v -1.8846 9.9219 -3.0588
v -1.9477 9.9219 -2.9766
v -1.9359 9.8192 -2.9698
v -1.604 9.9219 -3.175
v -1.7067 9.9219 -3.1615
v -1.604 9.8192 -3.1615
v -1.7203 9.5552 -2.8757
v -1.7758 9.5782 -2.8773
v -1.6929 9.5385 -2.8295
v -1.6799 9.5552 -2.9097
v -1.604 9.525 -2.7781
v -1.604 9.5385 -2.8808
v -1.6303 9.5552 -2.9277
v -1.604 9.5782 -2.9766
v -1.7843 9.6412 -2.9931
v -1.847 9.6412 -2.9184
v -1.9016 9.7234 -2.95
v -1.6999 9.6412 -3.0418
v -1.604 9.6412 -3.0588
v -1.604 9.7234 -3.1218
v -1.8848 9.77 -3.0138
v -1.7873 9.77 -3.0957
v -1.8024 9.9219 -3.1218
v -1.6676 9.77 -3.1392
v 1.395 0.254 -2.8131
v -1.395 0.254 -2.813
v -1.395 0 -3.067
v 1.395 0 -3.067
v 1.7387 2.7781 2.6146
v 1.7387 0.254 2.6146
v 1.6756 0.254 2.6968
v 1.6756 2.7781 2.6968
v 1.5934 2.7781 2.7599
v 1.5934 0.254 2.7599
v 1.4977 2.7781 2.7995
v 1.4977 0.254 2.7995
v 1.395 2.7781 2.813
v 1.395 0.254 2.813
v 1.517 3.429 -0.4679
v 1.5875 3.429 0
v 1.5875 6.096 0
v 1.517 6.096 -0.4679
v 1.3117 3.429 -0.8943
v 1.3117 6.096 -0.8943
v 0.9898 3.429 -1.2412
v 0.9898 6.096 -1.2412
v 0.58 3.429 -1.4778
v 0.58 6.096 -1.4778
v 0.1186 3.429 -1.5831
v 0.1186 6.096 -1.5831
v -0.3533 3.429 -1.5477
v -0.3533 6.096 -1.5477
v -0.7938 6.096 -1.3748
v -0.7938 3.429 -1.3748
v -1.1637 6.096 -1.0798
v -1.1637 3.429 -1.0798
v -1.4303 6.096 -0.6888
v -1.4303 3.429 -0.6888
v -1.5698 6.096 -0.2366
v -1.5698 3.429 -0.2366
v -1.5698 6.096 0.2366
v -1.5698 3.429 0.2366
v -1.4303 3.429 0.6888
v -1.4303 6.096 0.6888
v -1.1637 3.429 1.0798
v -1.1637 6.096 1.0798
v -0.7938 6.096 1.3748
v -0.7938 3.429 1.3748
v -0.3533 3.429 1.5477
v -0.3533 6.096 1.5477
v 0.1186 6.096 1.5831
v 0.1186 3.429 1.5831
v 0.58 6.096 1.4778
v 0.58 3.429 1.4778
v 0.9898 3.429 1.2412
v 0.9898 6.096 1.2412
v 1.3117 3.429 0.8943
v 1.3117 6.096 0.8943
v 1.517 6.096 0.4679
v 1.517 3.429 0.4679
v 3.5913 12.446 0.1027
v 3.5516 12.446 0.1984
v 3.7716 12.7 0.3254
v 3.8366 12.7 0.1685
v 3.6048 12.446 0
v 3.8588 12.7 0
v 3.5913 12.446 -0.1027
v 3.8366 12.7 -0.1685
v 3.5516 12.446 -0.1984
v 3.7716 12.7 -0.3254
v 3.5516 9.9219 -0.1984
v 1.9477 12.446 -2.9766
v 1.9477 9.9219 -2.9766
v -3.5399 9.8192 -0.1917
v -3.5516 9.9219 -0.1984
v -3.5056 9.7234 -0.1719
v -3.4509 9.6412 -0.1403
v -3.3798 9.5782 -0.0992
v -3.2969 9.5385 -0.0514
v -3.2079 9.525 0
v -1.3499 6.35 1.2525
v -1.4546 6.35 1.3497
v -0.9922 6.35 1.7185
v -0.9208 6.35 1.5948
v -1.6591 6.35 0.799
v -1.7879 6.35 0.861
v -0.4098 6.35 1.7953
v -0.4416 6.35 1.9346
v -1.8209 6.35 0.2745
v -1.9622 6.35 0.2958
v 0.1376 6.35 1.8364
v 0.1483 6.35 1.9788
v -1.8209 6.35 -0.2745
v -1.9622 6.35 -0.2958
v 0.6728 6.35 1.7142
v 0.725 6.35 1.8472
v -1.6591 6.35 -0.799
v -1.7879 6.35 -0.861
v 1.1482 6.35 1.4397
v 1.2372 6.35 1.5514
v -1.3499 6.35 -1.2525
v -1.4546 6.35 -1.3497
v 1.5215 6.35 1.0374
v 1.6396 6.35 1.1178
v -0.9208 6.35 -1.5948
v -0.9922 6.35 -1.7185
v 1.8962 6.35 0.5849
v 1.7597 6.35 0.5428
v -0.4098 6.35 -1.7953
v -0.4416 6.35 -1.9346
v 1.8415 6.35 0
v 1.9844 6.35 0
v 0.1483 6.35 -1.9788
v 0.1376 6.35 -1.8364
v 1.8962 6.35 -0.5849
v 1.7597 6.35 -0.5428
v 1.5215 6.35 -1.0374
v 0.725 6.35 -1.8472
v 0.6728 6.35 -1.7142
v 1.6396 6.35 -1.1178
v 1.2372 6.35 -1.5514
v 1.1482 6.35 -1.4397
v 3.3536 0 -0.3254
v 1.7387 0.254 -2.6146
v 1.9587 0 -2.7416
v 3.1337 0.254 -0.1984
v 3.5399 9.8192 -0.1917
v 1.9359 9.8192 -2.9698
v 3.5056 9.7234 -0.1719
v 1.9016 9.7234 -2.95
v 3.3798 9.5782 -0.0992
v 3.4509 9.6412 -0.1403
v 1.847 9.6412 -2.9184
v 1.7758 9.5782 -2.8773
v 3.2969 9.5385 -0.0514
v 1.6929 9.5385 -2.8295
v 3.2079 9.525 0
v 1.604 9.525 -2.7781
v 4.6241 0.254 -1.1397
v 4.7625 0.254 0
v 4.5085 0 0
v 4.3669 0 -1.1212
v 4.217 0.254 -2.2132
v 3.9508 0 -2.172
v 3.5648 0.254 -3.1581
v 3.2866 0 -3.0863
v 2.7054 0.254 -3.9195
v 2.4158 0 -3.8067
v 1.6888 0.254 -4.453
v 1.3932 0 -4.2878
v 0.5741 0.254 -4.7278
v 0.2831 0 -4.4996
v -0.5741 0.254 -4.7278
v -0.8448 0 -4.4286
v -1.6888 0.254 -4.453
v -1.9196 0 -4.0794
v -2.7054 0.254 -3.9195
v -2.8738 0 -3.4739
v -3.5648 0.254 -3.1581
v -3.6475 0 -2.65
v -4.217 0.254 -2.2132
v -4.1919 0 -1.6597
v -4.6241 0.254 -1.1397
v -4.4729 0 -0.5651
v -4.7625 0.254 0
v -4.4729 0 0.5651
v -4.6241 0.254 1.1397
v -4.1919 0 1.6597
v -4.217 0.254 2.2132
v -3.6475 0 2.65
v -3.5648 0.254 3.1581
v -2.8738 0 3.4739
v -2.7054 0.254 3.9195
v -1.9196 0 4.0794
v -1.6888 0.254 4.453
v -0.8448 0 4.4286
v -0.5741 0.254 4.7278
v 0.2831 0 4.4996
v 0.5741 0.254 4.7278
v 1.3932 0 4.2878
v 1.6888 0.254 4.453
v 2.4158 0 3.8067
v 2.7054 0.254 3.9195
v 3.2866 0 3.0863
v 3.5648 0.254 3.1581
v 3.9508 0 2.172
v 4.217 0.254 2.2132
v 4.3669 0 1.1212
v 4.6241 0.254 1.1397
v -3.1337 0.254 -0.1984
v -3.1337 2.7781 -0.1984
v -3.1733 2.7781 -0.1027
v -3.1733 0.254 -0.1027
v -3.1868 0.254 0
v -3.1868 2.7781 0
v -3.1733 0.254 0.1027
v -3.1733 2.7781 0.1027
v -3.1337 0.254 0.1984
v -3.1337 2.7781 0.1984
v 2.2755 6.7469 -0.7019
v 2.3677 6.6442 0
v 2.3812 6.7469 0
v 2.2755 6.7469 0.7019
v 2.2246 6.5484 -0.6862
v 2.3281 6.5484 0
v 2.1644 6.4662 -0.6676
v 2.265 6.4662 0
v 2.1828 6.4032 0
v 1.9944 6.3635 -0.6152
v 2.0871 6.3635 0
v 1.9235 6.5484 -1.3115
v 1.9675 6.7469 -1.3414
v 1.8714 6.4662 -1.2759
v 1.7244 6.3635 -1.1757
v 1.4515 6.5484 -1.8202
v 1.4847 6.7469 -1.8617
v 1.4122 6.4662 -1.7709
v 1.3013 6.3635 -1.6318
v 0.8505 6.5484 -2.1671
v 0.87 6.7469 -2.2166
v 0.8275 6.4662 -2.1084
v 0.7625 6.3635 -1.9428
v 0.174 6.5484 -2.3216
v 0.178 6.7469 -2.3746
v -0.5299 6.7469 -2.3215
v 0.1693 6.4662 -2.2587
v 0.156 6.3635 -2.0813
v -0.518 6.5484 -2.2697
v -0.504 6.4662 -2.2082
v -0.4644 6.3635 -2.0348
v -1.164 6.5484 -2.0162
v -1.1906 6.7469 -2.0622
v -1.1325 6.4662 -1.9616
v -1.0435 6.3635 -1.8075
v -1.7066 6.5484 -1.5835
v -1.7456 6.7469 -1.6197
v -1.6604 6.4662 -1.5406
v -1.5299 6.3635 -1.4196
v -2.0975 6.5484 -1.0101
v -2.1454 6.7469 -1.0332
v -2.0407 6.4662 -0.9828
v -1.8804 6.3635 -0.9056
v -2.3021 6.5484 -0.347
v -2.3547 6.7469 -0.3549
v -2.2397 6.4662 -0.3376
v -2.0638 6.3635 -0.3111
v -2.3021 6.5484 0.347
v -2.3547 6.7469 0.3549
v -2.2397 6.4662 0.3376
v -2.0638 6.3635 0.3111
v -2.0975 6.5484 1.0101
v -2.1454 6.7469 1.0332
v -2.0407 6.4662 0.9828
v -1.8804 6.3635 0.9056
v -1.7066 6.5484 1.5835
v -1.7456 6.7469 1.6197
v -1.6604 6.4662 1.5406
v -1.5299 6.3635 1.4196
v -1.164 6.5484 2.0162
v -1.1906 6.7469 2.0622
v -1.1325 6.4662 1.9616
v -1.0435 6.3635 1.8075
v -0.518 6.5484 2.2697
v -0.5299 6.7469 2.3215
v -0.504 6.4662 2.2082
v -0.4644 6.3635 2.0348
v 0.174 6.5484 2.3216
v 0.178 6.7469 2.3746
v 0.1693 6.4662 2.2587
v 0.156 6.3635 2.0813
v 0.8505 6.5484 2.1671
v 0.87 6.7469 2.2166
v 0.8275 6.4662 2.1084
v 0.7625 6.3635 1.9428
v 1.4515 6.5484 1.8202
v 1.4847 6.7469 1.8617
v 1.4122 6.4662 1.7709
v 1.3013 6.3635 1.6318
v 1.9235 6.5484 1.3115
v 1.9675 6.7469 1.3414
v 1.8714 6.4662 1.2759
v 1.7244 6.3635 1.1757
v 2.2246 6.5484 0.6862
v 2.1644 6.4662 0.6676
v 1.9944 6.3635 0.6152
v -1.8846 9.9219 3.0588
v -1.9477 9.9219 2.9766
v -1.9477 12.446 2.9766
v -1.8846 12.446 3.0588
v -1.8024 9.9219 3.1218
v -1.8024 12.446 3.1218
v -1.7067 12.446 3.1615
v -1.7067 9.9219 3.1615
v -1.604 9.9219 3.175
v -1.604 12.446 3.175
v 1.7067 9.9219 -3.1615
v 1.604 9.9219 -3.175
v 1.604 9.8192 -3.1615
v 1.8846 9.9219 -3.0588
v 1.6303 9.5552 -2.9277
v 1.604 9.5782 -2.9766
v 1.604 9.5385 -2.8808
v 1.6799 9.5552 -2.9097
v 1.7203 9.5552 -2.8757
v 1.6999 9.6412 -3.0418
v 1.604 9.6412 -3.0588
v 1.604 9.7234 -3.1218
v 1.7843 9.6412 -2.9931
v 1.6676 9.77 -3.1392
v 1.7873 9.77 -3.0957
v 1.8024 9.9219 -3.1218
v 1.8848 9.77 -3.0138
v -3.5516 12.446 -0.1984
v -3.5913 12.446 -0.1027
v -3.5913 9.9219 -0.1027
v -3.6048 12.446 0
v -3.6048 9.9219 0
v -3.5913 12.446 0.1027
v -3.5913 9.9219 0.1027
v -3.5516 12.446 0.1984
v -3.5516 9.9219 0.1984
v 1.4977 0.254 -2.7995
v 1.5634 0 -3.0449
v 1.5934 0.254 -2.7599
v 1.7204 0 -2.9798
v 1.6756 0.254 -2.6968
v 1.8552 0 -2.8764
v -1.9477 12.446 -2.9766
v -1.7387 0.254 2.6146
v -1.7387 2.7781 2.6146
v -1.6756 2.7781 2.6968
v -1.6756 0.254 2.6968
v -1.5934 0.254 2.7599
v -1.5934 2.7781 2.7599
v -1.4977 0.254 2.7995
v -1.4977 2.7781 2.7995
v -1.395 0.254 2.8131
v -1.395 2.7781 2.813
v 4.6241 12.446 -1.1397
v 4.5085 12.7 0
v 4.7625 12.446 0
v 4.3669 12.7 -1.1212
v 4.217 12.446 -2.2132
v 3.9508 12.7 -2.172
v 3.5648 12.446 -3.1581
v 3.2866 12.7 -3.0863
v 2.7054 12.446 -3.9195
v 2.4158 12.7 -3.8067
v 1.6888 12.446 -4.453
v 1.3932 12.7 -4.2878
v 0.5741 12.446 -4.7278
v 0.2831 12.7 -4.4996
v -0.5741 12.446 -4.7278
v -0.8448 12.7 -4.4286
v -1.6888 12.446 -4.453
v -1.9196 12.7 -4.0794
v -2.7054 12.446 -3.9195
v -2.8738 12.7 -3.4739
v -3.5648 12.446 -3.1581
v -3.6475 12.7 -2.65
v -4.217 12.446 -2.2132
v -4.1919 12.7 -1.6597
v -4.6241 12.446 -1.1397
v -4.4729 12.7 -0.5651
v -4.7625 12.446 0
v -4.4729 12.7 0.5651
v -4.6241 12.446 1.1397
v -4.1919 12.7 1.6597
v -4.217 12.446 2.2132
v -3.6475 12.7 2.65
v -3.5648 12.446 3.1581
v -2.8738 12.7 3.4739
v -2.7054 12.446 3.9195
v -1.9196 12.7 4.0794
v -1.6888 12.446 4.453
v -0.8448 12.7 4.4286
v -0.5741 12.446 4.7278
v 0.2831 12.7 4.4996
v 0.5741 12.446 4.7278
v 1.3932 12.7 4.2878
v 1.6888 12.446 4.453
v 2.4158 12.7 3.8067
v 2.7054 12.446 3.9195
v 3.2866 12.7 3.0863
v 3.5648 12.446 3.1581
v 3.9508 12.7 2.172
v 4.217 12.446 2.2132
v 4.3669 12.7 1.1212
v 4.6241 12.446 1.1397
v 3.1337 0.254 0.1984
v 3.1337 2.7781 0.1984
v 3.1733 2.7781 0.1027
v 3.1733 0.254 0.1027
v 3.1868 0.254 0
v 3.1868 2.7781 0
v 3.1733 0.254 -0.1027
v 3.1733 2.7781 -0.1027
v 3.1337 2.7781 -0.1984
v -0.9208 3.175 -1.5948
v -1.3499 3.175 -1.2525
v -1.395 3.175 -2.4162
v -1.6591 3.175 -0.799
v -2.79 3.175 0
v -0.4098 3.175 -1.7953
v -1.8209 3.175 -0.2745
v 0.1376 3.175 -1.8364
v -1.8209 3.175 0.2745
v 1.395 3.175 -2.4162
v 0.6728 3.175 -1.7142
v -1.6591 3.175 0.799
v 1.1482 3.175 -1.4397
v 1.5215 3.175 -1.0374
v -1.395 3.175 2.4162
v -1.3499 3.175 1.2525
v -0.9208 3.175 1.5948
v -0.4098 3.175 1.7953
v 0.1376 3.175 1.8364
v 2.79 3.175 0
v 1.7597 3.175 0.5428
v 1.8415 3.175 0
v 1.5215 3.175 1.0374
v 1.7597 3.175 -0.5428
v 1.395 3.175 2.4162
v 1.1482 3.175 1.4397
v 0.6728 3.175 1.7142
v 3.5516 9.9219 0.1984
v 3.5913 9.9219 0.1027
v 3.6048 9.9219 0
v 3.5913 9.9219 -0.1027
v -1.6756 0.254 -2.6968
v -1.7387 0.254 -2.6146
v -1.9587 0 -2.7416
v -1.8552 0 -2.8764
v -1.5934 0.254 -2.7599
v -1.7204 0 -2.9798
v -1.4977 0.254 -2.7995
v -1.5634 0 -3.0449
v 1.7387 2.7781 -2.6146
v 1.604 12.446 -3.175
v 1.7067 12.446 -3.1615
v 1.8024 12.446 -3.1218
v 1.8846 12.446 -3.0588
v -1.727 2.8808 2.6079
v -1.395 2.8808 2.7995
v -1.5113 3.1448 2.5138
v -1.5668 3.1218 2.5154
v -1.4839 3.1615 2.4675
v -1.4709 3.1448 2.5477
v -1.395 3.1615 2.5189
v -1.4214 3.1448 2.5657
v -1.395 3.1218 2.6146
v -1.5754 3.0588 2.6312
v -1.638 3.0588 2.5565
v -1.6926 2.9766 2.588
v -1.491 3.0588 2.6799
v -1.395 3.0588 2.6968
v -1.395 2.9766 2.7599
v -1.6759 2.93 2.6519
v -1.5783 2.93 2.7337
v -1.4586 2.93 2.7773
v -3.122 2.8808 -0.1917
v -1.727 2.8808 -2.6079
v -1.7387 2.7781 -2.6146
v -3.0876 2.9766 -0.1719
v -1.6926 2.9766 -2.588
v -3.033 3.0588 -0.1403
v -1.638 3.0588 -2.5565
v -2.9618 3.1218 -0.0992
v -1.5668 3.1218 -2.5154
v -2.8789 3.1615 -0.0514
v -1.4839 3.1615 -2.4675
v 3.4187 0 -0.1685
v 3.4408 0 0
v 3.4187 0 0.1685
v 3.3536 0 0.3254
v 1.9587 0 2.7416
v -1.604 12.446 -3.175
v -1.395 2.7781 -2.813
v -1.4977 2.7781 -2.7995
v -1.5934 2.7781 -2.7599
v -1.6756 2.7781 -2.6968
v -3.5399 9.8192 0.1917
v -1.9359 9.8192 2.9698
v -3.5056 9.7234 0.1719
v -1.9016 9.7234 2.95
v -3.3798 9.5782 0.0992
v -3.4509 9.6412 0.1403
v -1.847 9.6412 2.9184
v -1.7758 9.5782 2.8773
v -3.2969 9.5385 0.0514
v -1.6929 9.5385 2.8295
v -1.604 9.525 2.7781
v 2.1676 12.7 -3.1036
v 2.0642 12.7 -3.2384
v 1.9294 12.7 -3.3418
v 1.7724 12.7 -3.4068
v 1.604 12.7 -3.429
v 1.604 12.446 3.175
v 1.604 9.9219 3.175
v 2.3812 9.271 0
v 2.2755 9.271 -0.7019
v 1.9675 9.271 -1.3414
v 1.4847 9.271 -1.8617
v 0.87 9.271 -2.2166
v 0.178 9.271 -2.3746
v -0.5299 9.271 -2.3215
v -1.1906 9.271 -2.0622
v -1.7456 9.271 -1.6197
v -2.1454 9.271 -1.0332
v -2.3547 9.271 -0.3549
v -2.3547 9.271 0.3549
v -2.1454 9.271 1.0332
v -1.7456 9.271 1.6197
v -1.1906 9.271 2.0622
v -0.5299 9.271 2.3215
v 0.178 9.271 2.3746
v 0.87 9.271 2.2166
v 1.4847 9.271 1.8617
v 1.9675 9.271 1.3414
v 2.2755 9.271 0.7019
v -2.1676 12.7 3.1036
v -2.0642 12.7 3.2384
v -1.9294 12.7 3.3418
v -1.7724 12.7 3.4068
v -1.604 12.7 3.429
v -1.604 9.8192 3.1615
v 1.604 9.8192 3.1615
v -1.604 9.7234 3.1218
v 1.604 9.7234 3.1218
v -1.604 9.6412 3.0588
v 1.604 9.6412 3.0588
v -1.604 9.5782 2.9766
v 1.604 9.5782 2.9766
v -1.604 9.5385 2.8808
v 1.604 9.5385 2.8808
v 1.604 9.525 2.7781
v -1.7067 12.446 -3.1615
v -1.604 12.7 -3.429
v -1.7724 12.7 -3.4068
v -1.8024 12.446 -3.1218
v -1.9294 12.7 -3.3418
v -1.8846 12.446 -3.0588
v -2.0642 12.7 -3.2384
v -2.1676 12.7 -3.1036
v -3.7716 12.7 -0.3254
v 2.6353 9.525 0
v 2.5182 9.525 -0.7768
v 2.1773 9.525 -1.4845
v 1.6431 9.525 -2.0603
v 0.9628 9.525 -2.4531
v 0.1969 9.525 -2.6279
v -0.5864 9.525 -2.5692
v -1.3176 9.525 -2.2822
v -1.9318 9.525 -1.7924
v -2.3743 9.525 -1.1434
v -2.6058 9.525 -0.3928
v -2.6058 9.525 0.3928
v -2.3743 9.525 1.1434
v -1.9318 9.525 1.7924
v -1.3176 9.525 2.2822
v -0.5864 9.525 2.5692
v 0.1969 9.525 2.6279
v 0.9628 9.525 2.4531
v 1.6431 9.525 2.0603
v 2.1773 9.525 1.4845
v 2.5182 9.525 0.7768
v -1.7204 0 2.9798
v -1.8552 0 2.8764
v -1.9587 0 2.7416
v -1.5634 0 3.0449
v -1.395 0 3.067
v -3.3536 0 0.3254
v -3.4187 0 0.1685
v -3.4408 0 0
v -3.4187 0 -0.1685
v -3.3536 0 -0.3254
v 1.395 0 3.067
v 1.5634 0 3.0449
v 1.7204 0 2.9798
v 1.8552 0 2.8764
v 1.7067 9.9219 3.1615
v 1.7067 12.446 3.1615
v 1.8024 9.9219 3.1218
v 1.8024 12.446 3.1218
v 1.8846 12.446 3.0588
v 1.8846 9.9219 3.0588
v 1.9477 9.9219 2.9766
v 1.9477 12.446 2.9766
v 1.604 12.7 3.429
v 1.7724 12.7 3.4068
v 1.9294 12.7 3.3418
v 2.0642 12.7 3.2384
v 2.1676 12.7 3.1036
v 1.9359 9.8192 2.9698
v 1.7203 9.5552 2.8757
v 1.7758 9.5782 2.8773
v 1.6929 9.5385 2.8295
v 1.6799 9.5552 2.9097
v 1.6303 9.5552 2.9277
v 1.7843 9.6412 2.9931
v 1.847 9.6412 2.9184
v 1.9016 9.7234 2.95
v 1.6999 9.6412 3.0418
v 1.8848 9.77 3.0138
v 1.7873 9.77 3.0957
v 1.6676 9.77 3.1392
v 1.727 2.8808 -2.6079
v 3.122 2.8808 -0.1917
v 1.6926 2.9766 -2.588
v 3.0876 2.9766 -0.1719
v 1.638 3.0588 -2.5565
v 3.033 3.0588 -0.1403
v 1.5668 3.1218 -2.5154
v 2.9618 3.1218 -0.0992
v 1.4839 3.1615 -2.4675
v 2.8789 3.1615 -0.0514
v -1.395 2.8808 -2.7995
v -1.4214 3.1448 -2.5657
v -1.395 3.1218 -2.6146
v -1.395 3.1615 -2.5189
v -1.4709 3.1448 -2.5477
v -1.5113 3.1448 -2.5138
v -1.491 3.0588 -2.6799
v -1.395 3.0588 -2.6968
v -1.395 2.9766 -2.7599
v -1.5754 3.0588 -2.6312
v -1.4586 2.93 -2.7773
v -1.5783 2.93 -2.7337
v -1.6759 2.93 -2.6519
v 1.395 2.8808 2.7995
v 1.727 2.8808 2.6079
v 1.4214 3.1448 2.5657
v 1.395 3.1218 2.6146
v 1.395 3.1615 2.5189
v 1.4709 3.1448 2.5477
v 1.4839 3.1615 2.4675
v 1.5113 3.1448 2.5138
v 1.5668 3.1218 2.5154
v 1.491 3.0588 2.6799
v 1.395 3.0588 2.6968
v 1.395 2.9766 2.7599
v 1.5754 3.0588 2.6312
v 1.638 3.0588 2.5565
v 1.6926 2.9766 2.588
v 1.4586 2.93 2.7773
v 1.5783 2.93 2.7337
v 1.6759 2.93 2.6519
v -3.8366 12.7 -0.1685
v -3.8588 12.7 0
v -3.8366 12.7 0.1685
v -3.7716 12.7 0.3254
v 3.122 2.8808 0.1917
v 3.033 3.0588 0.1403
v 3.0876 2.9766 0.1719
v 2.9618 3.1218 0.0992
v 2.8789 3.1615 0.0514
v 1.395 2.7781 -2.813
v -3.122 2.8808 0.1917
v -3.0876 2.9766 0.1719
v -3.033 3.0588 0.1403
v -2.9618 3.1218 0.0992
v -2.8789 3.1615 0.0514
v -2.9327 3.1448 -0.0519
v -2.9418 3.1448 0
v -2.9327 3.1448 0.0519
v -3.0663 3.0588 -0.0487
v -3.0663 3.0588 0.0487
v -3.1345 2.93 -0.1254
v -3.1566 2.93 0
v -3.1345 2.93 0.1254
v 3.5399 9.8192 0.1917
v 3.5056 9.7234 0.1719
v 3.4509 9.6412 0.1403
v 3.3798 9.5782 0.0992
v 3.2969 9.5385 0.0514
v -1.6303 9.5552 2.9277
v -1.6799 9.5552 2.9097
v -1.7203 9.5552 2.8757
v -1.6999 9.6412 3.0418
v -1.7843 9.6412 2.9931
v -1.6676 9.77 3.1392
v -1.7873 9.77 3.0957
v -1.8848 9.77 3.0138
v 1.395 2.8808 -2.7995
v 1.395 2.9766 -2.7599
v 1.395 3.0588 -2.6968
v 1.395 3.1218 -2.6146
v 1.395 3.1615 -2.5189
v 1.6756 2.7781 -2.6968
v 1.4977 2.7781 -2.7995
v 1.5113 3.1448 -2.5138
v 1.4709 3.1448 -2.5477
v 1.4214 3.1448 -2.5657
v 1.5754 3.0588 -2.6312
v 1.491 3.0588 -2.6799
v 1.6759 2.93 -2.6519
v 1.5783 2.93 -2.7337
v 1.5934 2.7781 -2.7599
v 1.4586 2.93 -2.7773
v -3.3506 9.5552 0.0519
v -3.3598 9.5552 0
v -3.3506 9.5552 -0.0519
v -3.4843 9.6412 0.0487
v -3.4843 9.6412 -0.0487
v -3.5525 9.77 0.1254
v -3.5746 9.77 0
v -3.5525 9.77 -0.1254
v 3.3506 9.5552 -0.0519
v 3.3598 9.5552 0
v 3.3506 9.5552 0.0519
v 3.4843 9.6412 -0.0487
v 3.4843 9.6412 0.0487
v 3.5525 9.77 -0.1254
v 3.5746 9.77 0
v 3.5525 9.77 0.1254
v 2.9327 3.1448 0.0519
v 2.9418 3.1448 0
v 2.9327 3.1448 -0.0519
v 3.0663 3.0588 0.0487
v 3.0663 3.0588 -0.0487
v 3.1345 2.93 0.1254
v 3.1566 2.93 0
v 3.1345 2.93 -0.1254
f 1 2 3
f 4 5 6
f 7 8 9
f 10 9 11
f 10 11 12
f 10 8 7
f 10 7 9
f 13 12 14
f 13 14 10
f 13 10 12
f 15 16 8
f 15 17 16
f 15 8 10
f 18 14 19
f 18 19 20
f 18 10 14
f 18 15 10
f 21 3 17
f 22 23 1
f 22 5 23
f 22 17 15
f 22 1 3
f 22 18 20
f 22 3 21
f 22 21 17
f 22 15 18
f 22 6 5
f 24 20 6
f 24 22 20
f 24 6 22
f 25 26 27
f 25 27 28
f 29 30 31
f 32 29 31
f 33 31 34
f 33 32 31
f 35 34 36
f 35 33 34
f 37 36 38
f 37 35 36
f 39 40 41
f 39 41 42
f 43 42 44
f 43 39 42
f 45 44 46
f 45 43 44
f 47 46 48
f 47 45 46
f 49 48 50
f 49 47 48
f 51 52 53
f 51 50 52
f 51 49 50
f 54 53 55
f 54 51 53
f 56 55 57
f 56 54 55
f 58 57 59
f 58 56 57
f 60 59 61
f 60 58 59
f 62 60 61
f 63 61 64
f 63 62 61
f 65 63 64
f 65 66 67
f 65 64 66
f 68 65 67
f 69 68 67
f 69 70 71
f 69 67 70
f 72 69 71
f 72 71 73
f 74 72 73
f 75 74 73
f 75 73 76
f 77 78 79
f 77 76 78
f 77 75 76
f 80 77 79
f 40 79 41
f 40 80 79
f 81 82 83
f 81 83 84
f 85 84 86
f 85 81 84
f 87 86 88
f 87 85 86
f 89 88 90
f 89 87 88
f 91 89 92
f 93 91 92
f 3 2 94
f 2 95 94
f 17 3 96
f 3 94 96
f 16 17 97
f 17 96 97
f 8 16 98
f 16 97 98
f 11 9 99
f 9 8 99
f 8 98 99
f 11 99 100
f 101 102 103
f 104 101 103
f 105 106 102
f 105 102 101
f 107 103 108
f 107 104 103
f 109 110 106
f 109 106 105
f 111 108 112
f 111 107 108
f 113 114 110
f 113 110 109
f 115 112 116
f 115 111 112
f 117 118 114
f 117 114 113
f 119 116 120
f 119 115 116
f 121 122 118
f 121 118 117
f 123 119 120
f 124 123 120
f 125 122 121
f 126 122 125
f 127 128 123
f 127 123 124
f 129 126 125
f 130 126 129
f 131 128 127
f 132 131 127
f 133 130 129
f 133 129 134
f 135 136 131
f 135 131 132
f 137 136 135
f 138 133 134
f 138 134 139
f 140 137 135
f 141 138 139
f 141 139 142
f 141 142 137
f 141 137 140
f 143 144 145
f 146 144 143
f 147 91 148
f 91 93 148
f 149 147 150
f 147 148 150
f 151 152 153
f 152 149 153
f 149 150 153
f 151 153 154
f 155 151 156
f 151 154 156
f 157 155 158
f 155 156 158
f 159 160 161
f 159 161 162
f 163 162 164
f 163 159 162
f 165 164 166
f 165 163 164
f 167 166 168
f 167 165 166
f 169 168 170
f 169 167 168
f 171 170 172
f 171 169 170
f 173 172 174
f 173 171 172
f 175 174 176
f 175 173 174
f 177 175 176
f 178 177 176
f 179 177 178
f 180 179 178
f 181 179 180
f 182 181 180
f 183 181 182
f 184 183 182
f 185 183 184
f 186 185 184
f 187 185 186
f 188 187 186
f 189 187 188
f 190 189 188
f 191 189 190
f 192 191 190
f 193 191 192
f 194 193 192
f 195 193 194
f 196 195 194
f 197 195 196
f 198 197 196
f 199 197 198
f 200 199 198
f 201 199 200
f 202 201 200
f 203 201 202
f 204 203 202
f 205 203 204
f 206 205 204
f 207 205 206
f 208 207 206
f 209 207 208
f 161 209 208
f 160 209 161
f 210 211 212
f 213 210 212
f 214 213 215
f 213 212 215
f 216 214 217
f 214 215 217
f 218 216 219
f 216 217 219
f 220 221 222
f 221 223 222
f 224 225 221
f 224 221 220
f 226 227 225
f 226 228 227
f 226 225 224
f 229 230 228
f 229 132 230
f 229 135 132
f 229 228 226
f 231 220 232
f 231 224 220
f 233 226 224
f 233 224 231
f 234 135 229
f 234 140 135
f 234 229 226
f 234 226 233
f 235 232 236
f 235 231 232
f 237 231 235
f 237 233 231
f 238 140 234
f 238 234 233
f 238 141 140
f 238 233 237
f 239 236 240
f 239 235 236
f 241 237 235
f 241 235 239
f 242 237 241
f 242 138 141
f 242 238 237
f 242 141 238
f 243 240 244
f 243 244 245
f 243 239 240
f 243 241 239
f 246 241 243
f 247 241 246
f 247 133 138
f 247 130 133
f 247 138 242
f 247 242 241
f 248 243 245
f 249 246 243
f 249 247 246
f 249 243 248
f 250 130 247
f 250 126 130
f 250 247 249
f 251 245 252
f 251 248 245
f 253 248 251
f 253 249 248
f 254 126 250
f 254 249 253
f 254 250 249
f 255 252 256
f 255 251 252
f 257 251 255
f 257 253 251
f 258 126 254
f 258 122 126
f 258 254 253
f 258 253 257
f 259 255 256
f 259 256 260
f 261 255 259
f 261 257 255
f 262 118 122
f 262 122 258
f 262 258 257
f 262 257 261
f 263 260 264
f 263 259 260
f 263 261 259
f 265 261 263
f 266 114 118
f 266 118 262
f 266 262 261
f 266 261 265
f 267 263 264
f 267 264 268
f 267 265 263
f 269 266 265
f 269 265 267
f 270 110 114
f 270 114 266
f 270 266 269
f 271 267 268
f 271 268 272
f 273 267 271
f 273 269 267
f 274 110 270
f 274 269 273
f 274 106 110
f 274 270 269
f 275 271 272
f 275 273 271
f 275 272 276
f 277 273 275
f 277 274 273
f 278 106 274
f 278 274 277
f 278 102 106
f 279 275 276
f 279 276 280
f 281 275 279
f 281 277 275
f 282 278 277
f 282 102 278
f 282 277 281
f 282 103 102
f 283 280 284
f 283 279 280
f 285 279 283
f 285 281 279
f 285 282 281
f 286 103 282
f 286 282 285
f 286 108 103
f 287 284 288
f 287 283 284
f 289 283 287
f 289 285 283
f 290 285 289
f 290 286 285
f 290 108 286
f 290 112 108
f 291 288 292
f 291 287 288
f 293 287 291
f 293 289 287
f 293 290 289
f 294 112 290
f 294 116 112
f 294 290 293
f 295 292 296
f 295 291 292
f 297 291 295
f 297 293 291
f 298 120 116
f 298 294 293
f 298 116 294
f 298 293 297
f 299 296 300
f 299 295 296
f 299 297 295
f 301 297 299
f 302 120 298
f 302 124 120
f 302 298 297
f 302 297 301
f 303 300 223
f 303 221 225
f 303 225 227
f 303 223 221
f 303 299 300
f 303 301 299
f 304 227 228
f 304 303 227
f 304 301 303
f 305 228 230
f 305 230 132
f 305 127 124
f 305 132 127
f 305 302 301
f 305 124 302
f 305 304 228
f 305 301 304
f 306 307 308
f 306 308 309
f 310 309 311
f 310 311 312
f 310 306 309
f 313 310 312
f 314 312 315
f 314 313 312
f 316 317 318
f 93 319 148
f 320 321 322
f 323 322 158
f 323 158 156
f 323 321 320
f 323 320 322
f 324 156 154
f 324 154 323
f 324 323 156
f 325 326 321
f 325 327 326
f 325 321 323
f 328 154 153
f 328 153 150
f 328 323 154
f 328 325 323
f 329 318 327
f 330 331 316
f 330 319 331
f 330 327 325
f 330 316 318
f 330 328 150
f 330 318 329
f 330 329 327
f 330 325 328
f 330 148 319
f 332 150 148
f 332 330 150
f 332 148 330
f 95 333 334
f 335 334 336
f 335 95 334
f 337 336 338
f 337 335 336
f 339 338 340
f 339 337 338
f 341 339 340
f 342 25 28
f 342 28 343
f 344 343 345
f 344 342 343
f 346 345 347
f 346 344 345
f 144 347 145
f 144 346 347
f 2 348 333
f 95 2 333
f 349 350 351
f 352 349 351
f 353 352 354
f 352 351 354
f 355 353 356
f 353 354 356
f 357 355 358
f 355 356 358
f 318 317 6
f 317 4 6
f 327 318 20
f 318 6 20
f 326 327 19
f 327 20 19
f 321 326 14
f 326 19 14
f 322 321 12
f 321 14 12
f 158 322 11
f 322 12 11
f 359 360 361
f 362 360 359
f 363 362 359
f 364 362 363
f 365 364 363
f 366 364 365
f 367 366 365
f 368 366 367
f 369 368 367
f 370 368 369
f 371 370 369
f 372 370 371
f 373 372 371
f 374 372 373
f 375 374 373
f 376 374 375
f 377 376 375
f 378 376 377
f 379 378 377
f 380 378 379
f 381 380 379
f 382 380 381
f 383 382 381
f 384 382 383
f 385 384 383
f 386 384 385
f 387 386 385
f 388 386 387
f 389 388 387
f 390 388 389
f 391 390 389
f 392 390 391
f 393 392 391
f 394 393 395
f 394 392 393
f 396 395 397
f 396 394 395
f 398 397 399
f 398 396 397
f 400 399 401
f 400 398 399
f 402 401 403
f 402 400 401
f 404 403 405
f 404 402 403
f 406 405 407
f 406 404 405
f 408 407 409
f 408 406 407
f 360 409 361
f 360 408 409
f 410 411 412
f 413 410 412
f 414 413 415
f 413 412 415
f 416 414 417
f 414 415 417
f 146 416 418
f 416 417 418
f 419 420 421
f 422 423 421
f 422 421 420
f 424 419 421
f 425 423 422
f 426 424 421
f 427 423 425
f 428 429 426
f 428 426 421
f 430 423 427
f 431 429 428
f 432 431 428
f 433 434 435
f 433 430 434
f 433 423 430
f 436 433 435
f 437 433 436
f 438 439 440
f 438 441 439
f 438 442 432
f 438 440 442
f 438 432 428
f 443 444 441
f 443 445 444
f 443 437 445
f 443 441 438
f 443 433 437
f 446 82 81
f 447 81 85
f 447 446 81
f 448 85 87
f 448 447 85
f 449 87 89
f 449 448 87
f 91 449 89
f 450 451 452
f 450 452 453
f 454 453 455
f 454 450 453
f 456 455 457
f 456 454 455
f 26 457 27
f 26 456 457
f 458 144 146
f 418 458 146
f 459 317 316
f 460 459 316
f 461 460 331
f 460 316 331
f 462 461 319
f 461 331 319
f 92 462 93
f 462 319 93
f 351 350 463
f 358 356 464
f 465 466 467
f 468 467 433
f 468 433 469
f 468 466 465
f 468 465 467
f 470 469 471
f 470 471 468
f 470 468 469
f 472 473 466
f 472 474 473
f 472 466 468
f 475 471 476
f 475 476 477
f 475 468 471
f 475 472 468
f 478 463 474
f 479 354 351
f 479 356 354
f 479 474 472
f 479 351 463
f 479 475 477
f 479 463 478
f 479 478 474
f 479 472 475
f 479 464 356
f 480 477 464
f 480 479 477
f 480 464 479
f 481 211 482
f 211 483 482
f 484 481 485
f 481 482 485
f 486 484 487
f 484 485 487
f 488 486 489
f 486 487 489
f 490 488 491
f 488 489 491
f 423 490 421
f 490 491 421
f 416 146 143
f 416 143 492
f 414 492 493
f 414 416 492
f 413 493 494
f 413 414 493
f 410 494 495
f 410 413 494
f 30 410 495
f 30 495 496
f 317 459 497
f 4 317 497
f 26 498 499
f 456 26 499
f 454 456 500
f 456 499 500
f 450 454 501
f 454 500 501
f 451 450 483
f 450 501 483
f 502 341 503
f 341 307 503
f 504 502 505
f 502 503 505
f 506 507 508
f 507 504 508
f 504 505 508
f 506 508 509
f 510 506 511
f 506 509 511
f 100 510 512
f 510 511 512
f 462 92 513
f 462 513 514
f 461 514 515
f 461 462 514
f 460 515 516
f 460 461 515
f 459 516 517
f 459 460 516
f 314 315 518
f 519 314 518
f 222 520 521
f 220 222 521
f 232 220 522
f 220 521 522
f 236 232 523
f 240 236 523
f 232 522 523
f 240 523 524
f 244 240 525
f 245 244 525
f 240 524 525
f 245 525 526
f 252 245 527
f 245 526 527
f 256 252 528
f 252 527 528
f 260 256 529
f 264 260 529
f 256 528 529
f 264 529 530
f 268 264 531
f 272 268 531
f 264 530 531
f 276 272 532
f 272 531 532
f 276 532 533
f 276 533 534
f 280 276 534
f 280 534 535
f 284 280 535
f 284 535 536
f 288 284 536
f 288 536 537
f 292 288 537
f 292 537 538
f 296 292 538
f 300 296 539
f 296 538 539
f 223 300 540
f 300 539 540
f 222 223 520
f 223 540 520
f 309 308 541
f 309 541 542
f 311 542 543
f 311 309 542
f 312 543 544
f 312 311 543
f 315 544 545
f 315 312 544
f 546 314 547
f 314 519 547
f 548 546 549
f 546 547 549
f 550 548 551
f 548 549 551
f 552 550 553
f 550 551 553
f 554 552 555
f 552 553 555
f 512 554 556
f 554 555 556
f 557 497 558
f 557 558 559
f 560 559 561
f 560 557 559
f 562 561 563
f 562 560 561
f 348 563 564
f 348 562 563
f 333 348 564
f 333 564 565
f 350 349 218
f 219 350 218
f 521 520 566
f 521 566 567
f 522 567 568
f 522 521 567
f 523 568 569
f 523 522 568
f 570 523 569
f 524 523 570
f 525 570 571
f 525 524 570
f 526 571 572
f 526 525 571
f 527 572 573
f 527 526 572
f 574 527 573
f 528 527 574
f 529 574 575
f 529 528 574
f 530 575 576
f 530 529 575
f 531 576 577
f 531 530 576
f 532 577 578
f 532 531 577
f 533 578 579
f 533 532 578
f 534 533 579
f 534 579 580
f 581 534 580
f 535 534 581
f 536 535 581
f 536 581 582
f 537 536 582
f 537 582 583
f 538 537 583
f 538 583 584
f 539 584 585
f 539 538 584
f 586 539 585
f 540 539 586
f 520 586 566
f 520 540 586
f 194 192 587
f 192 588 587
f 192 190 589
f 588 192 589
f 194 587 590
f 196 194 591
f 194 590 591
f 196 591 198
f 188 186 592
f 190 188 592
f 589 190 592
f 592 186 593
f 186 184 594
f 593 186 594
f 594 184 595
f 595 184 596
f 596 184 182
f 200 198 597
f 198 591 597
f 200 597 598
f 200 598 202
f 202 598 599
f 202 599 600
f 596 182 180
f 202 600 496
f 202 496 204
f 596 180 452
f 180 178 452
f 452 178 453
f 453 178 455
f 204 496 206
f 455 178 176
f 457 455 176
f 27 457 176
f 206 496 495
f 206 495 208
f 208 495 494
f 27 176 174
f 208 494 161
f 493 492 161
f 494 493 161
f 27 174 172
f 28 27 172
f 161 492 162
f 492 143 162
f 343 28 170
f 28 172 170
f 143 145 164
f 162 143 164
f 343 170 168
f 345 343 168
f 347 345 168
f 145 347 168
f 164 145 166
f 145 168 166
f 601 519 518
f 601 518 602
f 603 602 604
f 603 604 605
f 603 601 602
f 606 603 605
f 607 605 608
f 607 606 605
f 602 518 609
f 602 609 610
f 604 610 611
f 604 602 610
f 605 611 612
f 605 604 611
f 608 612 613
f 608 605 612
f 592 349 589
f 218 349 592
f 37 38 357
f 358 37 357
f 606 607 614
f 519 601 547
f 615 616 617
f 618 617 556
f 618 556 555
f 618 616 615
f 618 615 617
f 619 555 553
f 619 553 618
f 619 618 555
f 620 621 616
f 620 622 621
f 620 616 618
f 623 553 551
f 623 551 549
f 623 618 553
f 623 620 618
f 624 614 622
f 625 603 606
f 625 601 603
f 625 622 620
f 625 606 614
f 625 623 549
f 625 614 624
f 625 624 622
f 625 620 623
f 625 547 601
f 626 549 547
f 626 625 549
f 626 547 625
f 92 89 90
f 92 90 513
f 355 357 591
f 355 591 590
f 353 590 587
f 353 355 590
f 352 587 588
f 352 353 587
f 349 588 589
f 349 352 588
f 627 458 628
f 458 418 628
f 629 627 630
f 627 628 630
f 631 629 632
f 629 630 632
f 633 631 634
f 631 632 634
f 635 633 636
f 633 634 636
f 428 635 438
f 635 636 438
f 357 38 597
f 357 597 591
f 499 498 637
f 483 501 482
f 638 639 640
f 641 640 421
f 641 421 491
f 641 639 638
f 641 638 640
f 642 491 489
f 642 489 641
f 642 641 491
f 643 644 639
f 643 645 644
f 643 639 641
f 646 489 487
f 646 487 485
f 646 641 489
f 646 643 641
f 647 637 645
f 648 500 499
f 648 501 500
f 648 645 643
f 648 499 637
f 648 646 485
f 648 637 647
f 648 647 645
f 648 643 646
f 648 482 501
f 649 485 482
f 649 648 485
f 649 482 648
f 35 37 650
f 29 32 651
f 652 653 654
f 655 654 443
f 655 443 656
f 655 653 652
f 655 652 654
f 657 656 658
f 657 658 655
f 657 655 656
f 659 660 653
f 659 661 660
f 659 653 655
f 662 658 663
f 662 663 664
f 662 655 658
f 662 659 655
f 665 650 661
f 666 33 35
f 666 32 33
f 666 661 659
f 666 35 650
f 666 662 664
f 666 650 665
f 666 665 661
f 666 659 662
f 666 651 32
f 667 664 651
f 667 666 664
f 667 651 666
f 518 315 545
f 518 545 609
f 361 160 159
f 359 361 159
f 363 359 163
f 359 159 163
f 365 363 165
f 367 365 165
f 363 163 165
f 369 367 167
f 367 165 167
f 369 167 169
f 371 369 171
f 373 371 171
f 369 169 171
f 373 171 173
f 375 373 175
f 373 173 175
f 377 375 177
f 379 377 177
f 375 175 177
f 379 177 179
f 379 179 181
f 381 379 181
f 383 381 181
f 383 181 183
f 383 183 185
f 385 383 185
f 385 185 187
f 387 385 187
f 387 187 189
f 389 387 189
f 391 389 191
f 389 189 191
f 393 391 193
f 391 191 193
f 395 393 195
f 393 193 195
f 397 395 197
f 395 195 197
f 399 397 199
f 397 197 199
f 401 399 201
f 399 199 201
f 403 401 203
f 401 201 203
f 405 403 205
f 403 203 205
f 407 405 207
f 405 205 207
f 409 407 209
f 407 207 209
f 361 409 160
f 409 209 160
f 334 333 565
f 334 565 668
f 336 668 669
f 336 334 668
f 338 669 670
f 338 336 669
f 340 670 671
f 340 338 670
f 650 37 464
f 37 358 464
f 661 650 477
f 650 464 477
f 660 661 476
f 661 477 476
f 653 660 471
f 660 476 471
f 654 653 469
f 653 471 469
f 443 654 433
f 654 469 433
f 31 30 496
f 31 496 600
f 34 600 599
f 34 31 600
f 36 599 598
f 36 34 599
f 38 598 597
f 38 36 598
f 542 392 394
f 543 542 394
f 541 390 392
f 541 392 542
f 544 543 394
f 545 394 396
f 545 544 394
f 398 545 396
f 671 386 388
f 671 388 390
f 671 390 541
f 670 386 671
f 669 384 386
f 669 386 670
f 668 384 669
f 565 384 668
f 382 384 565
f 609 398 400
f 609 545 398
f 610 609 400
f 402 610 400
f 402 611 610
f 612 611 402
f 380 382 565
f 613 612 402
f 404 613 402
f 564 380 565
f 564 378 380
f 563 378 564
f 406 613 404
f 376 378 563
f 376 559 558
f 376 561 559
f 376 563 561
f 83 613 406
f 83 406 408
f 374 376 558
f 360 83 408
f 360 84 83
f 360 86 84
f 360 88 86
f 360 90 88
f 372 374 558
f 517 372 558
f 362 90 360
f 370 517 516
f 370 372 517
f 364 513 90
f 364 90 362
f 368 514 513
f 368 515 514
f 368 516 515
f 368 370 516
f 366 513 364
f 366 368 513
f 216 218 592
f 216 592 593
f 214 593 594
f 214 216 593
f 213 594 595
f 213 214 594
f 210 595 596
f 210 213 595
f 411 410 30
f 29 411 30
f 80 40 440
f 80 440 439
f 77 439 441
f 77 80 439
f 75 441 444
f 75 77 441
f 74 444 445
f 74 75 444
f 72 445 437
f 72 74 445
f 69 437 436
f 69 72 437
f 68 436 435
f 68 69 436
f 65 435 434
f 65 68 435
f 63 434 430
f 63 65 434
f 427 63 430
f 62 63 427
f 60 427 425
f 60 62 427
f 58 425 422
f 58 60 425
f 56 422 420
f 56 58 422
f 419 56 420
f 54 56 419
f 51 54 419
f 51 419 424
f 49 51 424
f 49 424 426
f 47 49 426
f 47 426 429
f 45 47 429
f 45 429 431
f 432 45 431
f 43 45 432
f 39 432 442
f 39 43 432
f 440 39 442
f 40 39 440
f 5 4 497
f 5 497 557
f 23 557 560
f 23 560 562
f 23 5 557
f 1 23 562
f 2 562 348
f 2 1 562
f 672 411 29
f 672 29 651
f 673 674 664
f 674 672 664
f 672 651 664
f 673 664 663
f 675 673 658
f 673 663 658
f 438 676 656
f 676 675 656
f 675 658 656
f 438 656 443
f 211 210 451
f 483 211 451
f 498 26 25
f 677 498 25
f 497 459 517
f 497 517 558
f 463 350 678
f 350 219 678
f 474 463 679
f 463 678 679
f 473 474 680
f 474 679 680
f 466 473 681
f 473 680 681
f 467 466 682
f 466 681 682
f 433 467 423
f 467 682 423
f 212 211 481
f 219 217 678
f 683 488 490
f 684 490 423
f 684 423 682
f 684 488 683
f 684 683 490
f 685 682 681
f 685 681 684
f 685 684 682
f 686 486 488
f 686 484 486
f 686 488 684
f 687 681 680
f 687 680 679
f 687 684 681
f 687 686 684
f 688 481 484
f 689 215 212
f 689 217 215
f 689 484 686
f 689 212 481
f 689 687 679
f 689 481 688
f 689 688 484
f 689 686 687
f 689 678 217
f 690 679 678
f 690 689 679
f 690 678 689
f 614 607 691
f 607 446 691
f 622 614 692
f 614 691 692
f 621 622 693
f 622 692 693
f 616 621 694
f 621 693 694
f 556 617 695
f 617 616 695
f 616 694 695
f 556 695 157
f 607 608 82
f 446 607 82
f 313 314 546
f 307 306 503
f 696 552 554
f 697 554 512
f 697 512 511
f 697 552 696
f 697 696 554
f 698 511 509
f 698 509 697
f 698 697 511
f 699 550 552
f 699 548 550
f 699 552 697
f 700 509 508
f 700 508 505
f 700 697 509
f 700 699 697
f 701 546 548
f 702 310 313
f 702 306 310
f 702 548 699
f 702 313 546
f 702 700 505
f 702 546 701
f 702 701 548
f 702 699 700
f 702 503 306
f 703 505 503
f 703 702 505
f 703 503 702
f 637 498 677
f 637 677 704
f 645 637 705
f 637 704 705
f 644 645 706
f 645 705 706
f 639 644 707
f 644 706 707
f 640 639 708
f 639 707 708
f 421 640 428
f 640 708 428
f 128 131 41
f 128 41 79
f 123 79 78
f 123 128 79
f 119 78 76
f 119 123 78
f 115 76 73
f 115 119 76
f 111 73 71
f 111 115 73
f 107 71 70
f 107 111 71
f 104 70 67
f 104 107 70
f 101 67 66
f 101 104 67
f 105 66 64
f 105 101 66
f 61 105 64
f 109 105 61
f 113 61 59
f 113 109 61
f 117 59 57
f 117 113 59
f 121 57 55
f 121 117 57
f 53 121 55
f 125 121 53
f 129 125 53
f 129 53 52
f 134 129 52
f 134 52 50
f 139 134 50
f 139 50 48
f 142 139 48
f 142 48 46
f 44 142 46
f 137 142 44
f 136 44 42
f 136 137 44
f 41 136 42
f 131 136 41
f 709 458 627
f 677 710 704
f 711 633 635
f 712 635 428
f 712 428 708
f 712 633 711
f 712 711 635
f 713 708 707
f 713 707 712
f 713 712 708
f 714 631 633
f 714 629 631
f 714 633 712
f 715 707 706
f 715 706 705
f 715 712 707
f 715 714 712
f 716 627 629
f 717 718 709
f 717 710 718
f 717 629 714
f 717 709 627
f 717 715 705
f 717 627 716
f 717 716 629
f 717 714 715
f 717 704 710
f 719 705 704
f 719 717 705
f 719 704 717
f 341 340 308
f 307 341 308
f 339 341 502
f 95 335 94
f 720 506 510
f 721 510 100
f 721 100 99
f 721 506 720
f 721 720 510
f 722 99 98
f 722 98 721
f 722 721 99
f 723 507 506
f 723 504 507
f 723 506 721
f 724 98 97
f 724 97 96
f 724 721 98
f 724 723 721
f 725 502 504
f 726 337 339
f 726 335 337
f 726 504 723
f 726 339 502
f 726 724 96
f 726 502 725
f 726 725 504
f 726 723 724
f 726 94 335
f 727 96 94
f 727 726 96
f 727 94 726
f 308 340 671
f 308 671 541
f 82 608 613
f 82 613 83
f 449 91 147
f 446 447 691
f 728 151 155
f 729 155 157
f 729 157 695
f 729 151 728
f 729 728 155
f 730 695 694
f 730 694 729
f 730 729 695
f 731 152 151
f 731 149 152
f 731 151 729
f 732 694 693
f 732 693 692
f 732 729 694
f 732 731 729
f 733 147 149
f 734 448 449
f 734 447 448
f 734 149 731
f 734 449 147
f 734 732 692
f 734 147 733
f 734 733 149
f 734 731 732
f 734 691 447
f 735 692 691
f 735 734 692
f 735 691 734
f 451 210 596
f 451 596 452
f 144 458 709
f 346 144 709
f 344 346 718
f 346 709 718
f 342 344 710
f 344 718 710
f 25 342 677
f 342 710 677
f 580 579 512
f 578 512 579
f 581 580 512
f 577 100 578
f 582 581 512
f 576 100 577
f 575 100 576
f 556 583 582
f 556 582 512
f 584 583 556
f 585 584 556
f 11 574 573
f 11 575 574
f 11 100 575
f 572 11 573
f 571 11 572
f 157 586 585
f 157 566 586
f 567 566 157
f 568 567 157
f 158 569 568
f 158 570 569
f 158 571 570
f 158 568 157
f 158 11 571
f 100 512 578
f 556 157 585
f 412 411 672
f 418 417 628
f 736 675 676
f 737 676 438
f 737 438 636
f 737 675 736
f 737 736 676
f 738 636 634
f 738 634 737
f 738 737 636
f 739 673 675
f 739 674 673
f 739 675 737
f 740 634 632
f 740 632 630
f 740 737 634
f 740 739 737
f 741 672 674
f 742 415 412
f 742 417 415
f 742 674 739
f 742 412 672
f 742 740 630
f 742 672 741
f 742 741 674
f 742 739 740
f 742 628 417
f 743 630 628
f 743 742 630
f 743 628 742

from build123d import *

# Parameters (mm, degrees)
SKETCH4_R           = 4.7625
SKETCH4_R_2         = 1.5875
BOSS_EXTRUDE1_DEPTH = 12.7
CUT_EXTRUDE3_DEPTH  = 3.175
CUT_EXTRUDE2_DEPTH  = 3.175
SKETCH8_R           = 2.38125
CUT_EXTRUDE4_DEPTH  = 3.175
FILLET1_R           = 0.396875
CHAMFER1_SIZE       = 0.254


with BuildPart() as part:
    # Sketch4 → Boss-Extrude1 (new body)
    with BuildSketch(Plane(origin=(0, 0, 0), x_dir=(1, 0, 0), z_dir=(0, 1, 0))):
        Circle(SKETCH4_R)
        Circle(SKETCH4_R_2, mode=Mode.SUBTRACT)
    extrude(amount=BOSS_EXTRUDE1_DEPTH)

    # Sketch7 → Cut-Extrude3 (cut)
    with BuildSketch(Plane.XZ):
        Polygon((1.624115175, 2.81305), (-1.624115175, 2.81305), (-3.248230349, 0), (-1.624115175, -2.81305), (1.624115175, -2.81305), (3.248230349, 0), align=None)
    extrude(amount=-CUT_EXTRUDE3_DEPTH, mode=Mode.SUBTRACT)

    # Sketch6 → Cut-Extrude2 (cut)
    with BuildSketch(Plane(origin=(0, 12.7, 0), x_dir=(1, 0, 0), z_dir=(0, 1, 0))):
        Polygon((1.833087105, 3.175), (-1.833087105, 3.175), (-3.666174209, 0), (-1.833087105, -3.175), (1.833087105, -3.175), (3.666174209, 0), align=None)
    extrude(amount=-CUT_EXTRUDE2_DEPTH, mode=Mode.SUBTRACT)

    # Sketch8 → Cut-Extrude4 (cut)
    with BuildSketch(Plane(origin=(0, 9.525, 0), x_dir=(1, 0, 0), z_dir=(0, 1, 0))):
        Circle(SKETCH8_R)
    extrude(amount=-CUT_EXTRUDE4_DEPTH, mode=Mode.SUBTRACT)

    # Fillet1
    fillet1_edges = [part.edges().sort_by_distance(p)[0] for p in [
        (2.436172762, 3.175, 1.406525),
        (1.624115175, 1.5875, 2.81305),
        (2.436172762, 3.175, -1.406525),
        (3.248230349, 1.5875, 0),
        (0, 3.175, -2.81305),
        (1.624115175, 1.5875, -2.81305),
        (-2.436172762, 3.175, -1.406525),
        (-1.624115175, 1.5875, -2.81305),
        (-2.436172762, 3.175, 1.406525),
        (-3.248230349, 1.5875, 0),
        (0, 3.175, 2.81305),
        (-1.624115175, 1.5875, 2.81305),
        (2.749630657, 9.525, -1.5875),
        (1.833087105, 11.1125, -3.175),
        (2.749630657, 9.525, 1.5875),
        (3.666174209, 11.1125, 0),
        (0, 9.525, 3.175),
        (1.833087105, 11.1125, 3.175),
        (-2.749630657, 9.525, 1.5875),
        (-1.833087105, 11.1125, 3.175),
        (-2.749630657, 9.525, -1.5875),
        (-3.666174209, 11.1125, 0),
        (0, 9.525, -3.175),
        (-1.833087105, 11.1125, -3.175),
        (-2.38125, 6.35, 0),
    ]]
    fillet(fillet1_edges, radius=FILLET1_R)

    # Chamfer1
    chamfer1_edges = [part.edges().sort_by_distance(p)[0] for p in [
        (-1.5875, 3.175, 0),
        (-4.7625, 0, 0),
        (-4.7625, 12.7, 0),
        (-1.5875, 6.35, 0),
        (-2.38125, 9.525, 0),
        (2.436172762, 0, 1.406525),
        (2.436172762, 0, -1.406525),
        (0, 0, -2.81305),
        (-2.436172762, 0, -1.406525),
        (-2.436172762, 0, 1.406525),
        (0, 0, 2.81305),
        (0, 12.7, -3.175),
        (2.749630657, 12.7, -1.5875),
        (-2.749630657, 12.7, 1.5875),
        (-2.749630657, 12.7, -1.5875),
        (0, 12.7, 3.175),
        (2.749630657, 12.7, 1.5875),
        (3.186833573, 0, 0),
        (-1.593416787, 0, -2.759878832),
        (-3.186833573, 0, 0),
        (-1.593416787, 0, 2.759878832),
        (1.593416787, 0, 2.759878832),
        (1.593416787, 0, -2.759878832),
        (1.802388717, 12.7, -3.121828832),
        (-3.604777433, 12.7, 0),
        (-1.802388717, 12.7, 3.121828832),
        (1.802388717, 12.7, 3.121828832),
        (3.604777433, 12.7, 0),
        (-1.802388717, 12.7, -3.121828832),
    ]]
    chamfer(chamfer1_edges, length=CHAMFER1_SIZE)


solid = part.part
